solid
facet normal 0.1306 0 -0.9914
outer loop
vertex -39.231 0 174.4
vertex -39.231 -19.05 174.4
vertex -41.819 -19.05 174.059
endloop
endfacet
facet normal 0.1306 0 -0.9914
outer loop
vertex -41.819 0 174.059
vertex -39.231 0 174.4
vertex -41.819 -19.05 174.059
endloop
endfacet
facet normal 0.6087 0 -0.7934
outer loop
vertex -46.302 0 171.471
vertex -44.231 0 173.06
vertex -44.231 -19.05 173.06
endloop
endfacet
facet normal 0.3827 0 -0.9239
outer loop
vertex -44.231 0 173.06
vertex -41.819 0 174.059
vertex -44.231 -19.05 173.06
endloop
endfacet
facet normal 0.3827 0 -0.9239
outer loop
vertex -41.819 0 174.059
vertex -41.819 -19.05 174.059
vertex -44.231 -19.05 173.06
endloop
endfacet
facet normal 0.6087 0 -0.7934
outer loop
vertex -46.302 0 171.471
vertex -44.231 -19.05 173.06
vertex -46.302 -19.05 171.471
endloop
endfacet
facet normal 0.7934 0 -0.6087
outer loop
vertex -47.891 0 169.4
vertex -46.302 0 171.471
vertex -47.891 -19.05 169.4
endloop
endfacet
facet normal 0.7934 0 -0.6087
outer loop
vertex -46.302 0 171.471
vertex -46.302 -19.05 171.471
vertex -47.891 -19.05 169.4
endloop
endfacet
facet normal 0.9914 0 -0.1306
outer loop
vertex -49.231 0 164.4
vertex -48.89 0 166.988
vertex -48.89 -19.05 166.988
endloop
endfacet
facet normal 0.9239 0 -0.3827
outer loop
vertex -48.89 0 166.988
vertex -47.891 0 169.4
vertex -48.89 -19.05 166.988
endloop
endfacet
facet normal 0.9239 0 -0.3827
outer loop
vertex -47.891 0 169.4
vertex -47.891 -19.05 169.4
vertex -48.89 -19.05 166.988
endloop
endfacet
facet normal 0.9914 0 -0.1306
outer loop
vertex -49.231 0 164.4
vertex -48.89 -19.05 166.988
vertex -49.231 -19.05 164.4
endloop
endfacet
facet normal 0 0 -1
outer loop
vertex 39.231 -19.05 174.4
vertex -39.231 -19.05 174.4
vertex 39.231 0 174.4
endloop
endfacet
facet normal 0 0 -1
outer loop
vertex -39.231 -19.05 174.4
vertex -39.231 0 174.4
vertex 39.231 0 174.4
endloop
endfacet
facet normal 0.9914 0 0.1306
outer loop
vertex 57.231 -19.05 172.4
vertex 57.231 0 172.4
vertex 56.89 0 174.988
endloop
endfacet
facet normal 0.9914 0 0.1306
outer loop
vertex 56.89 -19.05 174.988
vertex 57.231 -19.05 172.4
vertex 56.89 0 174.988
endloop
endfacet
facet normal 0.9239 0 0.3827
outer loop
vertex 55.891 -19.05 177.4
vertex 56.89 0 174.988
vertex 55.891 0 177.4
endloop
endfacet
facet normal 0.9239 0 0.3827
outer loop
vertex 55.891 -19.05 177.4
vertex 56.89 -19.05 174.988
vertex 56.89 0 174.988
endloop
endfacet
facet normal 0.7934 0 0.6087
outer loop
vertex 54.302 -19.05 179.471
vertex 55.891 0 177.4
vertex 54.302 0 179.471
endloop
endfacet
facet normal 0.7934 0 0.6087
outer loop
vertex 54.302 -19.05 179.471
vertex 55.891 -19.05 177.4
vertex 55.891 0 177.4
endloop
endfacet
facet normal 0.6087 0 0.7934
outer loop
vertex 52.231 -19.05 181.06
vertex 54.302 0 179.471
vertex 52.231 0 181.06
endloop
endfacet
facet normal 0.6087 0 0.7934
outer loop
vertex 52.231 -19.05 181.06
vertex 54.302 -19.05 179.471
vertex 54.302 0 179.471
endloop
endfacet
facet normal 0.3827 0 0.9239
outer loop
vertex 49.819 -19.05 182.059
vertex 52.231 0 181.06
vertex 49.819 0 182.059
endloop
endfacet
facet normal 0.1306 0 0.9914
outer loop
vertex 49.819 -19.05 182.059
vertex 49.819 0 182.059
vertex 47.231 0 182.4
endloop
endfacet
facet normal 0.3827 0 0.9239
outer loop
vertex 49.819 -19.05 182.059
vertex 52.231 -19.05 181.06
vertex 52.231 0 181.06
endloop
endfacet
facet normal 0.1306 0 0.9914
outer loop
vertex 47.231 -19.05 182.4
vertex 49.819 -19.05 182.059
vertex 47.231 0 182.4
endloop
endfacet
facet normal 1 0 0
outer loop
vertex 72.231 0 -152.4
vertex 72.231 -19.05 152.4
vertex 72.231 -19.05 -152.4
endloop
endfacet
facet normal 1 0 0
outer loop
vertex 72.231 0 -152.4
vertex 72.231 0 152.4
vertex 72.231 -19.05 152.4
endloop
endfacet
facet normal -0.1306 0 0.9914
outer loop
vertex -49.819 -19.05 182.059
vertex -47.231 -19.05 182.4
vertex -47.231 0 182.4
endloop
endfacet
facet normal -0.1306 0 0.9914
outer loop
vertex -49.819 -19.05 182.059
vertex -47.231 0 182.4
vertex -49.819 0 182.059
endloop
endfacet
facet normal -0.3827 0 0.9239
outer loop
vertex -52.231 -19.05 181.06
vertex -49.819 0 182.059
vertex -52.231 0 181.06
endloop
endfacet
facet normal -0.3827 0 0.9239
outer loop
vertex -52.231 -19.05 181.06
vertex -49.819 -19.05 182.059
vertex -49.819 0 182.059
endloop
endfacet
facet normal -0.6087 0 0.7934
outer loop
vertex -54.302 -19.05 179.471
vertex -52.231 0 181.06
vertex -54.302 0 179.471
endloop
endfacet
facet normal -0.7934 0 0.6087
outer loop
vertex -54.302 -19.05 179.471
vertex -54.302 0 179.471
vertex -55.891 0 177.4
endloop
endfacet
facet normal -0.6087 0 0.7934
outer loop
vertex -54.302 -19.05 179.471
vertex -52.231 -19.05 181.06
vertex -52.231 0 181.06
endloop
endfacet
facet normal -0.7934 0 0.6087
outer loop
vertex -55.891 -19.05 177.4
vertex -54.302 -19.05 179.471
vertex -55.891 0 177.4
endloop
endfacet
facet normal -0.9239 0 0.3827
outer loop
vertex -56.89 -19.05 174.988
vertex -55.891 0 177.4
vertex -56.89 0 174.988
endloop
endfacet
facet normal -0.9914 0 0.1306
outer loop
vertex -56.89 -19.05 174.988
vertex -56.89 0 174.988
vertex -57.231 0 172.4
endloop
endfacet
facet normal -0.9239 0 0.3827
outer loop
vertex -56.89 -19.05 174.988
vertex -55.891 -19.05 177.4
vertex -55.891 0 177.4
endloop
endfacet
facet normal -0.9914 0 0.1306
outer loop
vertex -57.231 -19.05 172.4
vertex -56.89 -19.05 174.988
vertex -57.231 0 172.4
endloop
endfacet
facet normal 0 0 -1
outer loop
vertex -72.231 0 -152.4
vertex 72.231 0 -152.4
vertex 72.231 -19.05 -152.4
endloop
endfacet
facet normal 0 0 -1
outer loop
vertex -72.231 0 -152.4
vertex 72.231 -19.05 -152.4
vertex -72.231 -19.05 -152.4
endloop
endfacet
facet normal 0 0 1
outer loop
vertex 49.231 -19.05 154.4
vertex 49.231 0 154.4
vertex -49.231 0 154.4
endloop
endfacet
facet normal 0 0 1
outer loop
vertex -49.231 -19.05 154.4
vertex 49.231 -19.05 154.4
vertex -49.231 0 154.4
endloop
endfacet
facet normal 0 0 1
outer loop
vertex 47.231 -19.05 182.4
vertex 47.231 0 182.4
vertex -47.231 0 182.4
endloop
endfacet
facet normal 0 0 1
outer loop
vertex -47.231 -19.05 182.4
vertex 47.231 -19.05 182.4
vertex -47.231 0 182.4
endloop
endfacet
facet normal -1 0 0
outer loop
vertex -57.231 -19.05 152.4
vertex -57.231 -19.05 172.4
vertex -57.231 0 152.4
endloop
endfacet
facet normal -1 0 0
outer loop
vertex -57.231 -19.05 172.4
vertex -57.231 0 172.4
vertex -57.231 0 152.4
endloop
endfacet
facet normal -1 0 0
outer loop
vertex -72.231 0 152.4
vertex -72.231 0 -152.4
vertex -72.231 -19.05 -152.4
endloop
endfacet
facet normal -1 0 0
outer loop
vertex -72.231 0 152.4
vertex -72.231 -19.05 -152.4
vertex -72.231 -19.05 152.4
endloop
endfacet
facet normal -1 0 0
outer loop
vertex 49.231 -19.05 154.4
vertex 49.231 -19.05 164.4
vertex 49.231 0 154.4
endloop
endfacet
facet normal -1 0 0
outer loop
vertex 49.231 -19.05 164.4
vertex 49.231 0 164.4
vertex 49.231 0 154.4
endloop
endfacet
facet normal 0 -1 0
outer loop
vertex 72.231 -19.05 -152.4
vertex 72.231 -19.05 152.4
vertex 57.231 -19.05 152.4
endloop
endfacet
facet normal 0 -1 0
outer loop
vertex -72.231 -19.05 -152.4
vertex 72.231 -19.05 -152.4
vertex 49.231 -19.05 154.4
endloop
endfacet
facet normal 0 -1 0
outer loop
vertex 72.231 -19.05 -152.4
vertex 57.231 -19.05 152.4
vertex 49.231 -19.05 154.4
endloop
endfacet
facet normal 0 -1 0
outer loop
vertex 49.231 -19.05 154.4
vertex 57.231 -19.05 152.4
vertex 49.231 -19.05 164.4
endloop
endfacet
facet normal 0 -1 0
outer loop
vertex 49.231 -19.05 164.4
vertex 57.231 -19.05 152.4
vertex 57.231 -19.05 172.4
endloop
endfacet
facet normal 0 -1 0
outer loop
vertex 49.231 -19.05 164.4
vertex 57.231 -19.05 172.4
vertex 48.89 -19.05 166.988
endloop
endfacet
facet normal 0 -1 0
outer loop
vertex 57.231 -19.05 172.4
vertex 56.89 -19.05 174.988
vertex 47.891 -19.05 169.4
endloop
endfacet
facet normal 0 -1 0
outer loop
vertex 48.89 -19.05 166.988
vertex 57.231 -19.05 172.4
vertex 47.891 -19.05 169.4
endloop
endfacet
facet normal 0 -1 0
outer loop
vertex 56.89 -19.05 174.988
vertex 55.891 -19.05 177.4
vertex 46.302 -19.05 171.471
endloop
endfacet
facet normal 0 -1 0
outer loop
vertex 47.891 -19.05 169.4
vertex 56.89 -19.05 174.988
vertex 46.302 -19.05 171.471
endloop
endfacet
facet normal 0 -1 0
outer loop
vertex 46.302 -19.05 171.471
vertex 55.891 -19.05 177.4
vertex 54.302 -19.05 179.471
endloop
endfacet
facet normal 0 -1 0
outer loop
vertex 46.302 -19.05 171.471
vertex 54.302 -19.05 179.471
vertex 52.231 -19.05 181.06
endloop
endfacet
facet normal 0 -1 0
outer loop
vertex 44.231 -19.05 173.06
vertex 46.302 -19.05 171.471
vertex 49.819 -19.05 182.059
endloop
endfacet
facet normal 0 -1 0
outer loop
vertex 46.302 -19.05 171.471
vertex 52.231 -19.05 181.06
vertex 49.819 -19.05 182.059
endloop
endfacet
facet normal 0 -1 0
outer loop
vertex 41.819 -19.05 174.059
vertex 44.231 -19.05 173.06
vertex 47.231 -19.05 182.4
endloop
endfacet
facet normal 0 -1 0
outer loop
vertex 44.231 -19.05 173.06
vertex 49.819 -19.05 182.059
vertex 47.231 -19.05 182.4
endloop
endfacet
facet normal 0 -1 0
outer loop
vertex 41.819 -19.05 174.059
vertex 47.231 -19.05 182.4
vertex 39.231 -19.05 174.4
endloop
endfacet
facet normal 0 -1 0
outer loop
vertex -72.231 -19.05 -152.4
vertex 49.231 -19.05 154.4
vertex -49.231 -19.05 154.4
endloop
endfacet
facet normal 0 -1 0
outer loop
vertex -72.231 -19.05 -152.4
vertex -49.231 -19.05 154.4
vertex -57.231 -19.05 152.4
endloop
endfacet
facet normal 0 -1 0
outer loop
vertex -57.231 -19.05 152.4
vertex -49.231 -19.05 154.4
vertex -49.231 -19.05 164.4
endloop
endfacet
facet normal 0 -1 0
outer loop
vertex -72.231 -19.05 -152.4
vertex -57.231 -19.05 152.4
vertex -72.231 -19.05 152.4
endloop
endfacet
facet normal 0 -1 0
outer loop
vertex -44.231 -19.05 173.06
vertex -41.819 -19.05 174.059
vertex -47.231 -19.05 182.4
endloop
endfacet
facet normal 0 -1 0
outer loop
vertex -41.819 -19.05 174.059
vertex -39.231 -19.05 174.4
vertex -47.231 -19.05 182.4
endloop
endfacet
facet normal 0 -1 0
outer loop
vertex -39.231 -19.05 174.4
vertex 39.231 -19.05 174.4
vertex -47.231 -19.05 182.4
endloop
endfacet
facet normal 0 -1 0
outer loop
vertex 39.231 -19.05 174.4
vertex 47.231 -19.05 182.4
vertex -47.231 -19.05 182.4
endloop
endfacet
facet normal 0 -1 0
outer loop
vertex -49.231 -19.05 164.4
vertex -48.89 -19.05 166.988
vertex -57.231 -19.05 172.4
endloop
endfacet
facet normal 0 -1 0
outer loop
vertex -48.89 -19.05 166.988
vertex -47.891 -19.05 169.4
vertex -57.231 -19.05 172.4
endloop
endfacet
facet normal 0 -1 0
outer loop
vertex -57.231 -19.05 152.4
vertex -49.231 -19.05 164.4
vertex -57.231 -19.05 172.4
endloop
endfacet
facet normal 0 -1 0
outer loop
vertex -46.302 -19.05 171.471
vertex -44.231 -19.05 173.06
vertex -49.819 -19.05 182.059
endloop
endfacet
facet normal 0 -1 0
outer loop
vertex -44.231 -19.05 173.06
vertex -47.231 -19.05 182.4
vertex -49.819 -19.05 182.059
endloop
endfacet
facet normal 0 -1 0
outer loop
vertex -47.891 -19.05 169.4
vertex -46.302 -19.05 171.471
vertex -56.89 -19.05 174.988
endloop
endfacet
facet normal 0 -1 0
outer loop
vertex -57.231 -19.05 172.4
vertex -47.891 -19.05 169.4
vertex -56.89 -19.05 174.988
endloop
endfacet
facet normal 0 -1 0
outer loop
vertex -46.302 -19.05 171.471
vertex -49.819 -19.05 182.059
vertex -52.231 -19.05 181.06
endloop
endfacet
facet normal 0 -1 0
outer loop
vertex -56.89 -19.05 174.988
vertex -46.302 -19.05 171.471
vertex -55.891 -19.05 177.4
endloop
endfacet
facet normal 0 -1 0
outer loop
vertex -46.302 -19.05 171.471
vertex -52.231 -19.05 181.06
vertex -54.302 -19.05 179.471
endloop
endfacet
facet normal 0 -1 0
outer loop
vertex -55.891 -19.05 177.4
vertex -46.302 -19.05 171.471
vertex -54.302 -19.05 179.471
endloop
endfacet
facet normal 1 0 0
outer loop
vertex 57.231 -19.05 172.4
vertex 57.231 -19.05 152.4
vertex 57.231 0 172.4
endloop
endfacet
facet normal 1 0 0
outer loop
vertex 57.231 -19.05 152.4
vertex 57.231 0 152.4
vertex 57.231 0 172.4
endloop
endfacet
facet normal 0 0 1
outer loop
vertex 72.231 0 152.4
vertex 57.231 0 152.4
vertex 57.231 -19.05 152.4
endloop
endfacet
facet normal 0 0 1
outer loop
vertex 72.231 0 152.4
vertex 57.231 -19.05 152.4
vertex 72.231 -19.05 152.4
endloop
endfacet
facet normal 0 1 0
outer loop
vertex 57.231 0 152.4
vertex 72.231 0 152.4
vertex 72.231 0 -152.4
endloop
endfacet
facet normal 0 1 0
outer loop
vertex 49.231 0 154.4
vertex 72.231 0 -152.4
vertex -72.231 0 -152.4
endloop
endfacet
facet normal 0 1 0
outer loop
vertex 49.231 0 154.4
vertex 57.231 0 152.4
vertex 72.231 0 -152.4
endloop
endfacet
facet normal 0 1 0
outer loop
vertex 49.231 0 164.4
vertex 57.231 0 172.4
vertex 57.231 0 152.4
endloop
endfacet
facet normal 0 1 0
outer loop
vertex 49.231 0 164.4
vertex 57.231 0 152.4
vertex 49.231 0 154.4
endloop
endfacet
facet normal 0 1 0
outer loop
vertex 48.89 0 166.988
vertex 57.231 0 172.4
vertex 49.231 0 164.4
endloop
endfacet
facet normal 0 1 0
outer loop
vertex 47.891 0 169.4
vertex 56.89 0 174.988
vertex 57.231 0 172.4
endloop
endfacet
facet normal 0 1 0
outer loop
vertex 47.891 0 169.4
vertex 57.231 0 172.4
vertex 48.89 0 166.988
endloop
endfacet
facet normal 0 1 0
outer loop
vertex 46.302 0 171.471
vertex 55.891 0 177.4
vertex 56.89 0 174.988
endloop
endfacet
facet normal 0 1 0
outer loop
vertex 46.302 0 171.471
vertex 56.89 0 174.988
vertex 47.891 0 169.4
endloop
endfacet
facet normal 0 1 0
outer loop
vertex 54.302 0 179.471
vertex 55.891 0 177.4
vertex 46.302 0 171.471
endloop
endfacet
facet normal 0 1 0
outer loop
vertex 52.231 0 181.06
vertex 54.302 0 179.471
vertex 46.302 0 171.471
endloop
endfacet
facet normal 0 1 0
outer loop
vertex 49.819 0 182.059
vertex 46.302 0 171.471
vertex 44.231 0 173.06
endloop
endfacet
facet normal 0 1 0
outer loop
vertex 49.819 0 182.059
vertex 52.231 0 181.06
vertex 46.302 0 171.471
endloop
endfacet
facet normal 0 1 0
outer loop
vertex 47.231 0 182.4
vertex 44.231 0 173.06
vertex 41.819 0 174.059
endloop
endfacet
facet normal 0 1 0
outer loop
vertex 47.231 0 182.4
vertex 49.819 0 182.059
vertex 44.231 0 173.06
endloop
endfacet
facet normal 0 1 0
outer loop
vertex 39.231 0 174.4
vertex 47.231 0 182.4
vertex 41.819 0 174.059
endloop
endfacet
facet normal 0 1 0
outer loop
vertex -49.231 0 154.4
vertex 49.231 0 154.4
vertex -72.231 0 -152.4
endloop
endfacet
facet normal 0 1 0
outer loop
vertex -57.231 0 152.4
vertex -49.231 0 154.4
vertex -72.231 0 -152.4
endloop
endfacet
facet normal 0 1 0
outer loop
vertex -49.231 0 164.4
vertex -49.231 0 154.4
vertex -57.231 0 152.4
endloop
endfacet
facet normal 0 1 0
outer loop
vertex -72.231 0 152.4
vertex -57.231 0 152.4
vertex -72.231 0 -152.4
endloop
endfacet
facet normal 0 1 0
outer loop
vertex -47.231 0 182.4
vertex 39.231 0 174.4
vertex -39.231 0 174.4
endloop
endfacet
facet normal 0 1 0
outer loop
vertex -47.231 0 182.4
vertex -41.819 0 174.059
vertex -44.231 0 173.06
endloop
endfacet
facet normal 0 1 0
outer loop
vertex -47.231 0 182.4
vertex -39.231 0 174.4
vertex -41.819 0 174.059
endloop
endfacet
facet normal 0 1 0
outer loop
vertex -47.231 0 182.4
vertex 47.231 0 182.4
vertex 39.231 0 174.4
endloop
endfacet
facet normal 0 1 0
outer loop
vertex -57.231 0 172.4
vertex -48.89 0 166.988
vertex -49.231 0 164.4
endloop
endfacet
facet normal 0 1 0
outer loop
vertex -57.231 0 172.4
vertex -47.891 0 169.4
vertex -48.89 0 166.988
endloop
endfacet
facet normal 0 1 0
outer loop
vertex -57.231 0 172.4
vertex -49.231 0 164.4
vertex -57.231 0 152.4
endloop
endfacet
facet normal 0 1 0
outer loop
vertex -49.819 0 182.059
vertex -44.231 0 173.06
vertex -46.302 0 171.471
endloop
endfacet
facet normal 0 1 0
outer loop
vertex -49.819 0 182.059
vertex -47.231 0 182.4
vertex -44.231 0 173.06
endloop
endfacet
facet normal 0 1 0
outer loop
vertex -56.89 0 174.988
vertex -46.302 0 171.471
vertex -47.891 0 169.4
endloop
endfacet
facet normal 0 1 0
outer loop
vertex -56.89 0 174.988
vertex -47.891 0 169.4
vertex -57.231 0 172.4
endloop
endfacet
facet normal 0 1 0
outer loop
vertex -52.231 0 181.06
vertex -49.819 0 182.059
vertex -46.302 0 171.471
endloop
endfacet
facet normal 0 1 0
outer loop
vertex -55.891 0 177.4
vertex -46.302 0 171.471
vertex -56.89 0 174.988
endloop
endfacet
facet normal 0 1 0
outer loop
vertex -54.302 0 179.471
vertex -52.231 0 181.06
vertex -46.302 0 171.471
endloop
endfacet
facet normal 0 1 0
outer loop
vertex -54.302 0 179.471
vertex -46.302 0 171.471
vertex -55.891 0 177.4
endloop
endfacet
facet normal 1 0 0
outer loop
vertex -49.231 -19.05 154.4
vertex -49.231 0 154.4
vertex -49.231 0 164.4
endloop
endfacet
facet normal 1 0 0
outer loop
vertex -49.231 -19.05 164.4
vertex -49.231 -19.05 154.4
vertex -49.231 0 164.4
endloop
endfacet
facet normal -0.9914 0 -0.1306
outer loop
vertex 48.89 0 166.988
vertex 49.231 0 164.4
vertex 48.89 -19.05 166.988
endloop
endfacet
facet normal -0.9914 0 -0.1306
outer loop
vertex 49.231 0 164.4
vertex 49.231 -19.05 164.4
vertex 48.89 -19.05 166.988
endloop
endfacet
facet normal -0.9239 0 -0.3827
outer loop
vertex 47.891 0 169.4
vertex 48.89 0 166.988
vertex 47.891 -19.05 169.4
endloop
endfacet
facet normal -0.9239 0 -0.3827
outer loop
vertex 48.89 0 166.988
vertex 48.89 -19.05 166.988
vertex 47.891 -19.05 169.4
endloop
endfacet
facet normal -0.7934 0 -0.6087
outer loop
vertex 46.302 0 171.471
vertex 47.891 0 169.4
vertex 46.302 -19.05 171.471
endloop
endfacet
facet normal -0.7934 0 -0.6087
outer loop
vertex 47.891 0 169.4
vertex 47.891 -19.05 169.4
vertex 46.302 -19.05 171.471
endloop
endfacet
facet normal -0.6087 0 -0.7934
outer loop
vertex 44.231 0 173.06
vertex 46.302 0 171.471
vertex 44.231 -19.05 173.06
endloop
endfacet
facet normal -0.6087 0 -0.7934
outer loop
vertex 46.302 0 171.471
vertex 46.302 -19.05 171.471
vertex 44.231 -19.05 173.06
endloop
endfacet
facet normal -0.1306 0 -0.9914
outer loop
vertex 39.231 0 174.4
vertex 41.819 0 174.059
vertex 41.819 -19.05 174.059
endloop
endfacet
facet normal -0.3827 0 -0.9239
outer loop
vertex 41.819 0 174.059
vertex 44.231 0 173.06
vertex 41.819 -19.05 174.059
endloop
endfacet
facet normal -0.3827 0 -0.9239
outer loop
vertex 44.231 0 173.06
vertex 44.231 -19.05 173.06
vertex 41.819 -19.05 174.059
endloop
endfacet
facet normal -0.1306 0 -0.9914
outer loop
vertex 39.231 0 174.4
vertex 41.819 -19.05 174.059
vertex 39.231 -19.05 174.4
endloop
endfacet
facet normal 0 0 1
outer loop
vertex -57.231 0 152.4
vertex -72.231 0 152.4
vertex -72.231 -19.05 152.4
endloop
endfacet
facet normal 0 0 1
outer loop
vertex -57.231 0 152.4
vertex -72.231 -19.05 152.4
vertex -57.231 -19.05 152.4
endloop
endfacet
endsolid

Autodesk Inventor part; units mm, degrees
ref_plane "YZ Plane" through (0, 0, 0) normal (1, 0, 0) x (0, 1, 0)
ref_plane "XZ Plane" through (0, 0, 0) normal (0, 1, 0) x (-1, 0, 0)
ref_plane "XY Plane" through (0, 0, 0) normal (0, 0, 1) x (1, 0, 0)
sketch "Sketch1" plane through (0, 0, 0) normal (0, 1, 0) x (-1, 0, 0)
  line L0 (-72.2313, -152.4) -> (72.2313, -152.4)
  line L1 (72.2313, -152.4) -> (72.2312, 152.4)
  line L2 (72.2312, 152.4) -> (-72.2312, 152.4)
  line L3 (-72.2312, 152.4) -> (-72.2313, -152.4)
  line L4 (-72.2313, -152.4) -> (72.2312, 152.4) construction
  line L5 (72.2313, -152.4) -> (-72.2312, 152.4) construction
  point P0 (0, 0)
  dimension "d0" = 144.4625
  dimension "d1" = 304.8
extrude "Extrusion1" add sketch "Sketch1" against normal blind 19.05
sketch "Sketch2" plane through (0, 0, 0) normal (0, 1, 0) x (1, 0, 0)
  line L0 (72.2312, -152.4) -> (-72.2312, -152.4) projected
  line L1 (-57.2312, -152.4) -> (57.2312, -152.4)
  line L2 (57.2312, -152.4) -> (57.2312, -182.4)
  line L3 (57.2312, -182.4) -> (-57.2312, -182.4)
  line L4 (-57.2312, -182.4) -> (-57.2312, -152.4)
  line L5 (-72.2313, 152.4) -> (-72.2312, -152.4) projected
  line L6 (72.2312, -152.4) -> (72.2313, 152.4) projected
  point P0 (0, 0)
  dimension "d4" = 15
  dimension "d5" = 15
  dimension "d6" = 30
extrude "Extrusion2" add sketch "Sketch2" against normal blind 19.05
sketch "Sketch3" plane through (0, 0, 0) normal (0, 1, 0) x (1, 0, 0)
  line L0 (-49.2312, -174.4) -> (49.2312, -174.4)
  line L1 (49.2312, -174.4) -> (49.2312, -154.4)
  line L2 (49.2312, -154.4) -> (-49.2312, -154.4)
  line L3 (-49.2312, -154.4) -> (-49.2312, -174.4)
  line L4 (-57.2312, -152.4) -> (-57.2312, -182.4) projected
  line L5 (-57.2312, -182.4) -> (57.2312, -182.4) projected
  line L6 (-72.2312, -152.4) -> (-57.2312, -152.4) projected
  line L7 (57.2312, -182.4) -> (57.2312, -152.4) projected
  point P0 (0, 0)
  point P1 (-57.2312, -167.4)
  dimension "d9" = 8
  dimension "d10" = 8
  dimension "d11" = 2
  dimension "d12" = 8
extrude "Extrusion3" cut sketch "Sketch3" against normal blind 19.05
fillet "Fillet1" radius 10 1 edges at (57.2312, -9.525, 182.4)
fillet "Fillet2" radius 10 1 edges at (-57.2312, -9.525, 182.4)
fillet "Fillet3" radius 10 1 edges at (-49.2312, -9.525, 174.4)
fillet "Fillet4" radius 10 1 edges at (49.2312, -9.525, 174.4)
properties material "Wood (Maple)"
